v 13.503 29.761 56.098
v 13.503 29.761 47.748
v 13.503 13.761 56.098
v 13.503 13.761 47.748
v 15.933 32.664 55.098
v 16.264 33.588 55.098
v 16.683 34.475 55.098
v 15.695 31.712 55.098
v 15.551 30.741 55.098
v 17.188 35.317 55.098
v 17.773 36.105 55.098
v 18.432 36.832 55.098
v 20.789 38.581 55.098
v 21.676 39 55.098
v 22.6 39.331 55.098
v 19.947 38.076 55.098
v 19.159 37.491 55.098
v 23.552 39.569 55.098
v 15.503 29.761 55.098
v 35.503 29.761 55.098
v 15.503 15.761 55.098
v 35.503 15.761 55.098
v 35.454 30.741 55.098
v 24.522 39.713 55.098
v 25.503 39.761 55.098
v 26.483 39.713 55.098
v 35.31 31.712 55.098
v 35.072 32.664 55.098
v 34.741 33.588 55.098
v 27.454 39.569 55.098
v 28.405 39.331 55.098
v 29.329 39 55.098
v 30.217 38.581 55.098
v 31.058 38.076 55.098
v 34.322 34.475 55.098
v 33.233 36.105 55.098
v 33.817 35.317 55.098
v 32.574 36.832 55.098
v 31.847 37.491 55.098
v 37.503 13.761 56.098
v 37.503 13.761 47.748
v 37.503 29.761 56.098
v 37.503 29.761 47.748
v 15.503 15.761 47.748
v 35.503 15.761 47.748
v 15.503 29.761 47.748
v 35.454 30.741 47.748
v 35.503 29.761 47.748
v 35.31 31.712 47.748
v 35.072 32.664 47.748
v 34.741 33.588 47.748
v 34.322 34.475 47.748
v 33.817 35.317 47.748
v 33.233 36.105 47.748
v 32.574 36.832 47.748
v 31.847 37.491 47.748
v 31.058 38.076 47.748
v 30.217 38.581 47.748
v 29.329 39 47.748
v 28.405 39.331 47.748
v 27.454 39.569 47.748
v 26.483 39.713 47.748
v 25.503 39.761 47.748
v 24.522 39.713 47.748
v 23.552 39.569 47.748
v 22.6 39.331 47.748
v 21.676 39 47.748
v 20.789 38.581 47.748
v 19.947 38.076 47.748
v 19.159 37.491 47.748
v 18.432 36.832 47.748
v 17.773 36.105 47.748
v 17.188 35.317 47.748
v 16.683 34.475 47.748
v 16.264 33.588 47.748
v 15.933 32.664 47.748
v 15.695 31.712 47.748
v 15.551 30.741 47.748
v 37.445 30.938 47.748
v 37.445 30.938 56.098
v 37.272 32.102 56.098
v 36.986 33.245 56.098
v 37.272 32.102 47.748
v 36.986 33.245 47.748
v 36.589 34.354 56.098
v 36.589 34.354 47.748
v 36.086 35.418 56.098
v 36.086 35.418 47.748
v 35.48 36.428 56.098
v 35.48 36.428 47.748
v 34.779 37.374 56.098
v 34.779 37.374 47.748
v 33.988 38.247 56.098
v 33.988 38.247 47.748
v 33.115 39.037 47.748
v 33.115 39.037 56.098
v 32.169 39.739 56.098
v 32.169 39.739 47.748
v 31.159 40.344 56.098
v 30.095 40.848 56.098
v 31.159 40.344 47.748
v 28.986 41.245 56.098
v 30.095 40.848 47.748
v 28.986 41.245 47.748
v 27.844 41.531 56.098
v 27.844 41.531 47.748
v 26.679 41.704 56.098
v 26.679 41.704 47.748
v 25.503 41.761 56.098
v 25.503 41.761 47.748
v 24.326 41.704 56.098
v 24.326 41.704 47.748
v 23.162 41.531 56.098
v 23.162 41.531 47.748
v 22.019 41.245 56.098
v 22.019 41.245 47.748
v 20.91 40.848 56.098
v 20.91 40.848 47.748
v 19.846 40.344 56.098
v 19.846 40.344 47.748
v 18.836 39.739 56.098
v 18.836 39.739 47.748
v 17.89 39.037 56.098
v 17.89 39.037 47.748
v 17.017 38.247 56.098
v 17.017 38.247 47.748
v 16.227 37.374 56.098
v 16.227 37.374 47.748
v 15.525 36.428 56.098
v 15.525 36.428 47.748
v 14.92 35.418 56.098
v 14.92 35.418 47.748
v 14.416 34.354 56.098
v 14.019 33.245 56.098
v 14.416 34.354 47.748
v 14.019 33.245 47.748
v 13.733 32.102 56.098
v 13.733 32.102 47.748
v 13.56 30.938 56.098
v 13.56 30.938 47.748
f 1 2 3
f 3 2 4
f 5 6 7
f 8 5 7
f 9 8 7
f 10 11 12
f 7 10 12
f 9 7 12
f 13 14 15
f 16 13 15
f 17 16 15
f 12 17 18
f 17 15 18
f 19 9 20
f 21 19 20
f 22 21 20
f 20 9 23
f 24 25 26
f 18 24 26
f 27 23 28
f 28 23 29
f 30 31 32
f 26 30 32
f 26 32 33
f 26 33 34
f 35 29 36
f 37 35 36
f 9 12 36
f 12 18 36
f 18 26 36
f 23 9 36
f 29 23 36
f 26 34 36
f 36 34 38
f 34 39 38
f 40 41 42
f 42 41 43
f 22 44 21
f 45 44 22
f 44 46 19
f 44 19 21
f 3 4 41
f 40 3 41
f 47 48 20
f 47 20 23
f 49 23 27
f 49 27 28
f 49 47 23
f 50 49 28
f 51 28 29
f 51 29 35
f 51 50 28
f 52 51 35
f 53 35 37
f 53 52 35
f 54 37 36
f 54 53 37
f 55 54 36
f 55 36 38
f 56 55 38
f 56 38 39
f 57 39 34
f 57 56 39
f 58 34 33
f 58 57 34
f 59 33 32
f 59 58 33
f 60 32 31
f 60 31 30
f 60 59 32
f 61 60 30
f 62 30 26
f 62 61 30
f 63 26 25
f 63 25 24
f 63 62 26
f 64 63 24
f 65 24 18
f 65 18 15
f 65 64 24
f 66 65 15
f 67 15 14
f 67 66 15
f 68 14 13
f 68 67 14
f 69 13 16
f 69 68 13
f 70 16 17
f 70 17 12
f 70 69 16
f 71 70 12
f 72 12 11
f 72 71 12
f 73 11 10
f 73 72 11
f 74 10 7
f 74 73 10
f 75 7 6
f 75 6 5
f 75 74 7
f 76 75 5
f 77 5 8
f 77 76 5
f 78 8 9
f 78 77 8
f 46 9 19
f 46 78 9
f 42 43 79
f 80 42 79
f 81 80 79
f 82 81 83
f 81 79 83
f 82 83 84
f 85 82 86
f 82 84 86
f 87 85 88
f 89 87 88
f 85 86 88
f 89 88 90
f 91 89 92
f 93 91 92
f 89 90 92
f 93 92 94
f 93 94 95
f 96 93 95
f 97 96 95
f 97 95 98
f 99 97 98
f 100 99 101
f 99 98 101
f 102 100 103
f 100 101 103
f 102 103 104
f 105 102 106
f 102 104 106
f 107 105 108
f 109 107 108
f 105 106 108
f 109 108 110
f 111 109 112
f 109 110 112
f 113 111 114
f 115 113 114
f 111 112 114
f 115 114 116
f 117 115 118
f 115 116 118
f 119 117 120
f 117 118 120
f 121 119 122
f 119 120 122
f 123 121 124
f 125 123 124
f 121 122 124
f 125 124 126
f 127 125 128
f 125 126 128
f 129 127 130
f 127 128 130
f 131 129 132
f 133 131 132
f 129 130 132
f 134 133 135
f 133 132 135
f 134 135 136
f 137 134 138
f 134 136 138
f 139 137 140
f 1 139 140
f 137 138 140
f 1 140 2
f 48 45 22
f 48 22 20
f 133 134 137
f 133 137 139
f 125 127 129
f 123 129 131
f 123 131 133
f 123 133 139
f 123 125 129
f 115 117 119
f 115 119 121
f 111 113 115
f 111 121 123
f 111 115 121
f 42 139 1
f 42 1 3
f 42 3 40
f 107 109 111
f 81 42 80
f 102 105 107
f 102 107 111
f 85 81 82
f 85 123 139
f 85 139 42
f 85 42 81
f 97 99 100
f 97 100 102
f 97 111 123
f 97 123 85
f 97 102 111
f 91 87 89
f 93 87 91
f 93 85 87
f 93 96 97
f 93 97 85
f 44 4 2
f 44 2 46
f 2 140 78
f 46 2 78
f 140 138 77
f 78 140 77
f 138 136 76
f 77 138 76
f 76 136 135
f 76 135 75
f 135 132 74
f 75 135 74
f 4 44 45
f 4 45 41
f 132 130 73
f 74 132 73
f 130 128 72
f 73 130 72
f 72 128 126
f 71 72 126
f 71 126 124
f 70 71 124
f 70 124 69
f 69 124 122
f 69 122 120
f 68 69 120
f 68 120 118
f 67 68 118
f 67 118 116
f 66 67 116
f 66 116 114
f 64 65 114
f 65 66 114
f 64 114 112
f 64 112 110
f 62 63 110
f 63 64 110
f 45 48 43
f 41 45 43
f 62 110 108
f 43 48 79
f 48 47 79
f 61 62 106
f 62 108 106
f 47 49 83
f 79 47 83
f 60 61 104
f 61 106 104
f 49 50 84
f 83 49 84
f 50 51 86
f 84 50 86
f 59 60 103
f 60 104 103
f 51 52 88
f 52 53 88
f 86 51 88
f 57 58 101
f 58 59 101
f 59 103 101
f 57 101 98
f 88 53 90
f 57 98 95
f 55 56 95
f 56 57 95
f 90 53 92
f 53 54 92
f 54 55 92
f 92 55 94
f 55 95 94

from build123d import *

# Parameters (mm, degrees)
SKETCH1_R           = 8.5
BOSS_EXTRUDE1_DEPTH = 1
BOSS_EXTRUDE2_START = -7.35
BOSS_EXTRUDE2_DEPTH = 7.35


with BuildPart() as part:
    # Sketch1 → Boss-Extrude1 (new body)
    # profile 1 of 3: a face of its own
    with BuildSketch(Plane.XY.offset(55.098344014)):
        with BuildLine():
            Line((37.502628192, 13.761312554), (37.502628192, 29.761312554))
            ThreePointArc((37.502628192, 29.761312554), (25.502628192, 41.761312554), (13.502628192, 29.761312554))
            Line((13.502628192, 29.761312554), (13.502628192, 13.761312554))
            Line((13.502628192, 13.761312554), (37.502628192, 13.761312554))
        make_face()
        with BuildLine():
            ThreePointArc((35.502628192, 29.761312554), (25.502628192, 39.761312554), (15.502628192, 29.761312554))
            Line((15.502628192, 29.761312554), (15.502628192, 15.761312554))
            Line((15.502628192, 15.761312554), (35.502628192, 15.761312554))
            Line((35.502628192, 15.761312554), (35.502628192, 29.761312554))
        make_face(mode=Mode.SUBTRACT)
    # profile 2 of 3: a face of its own
    with BuildSketch(Plane.XY.offset(55.098344014)):
        with BuildLine():
            Line((35.502628192, 15.761312554), (35.502628192, 29.761312554))
            ThreePointArc((35.502628192, 29.761312554), (25.502628192, 39.761312554), (15.502628192, 29.761312554))
            Line((15.502628192, 29.761312554), (15.502628192, 15.761312554))
            Line((15.502628192, 15.761312554), (35.502628192, 15.761312554))
        make_face()
        with Locations((25.502628192, 29.761312554)):
            Circle(SKETCH1_R, mode=Mode.SUBTRACT)
    # profile 3 of 3: a face of its own
    with BuildSketch(Plane.XY.offset(55.098344014)):
        with Locations((25.502628192, 29.761312554)):
            Circle(SKETCH1_R)
    extrude(amount=BOSS_EXTRUDE1_DEPTH)

    # Sketch1<4> → Boss-Extrude2 (add)
    with BuildSketch(Plane.XY.offset(55.098344014).offset(BOSS_EXTRUDE2_START)):
        with BuildLine():
            Line((13.502628192, 29.761312554), (13.502628192, 13.761312554))
            Line((13.502628192, 13.761312554), (37.502628192, 13.761312554))
            Line((37.502628192, 13.761312554), (37.502628192, 29.761312554))
            ThreePointArc((37.502628192, 29.761312554), (25.502628192, 41.761312554), (13.502628192, 29.761312554))
        make_face()
        with BuildLine():
            Line((15.502628192, 29.761312554), (15.502628192, 15.761312554))
            Line((15.502628192, 15.761312554), (35.502628192, 15.761312554))
            Line((35.502628192, 15.761312554), (35.502628192, 29.761312554))
            ThreePointArc((35.502628192, 29.761312554), (25.502628192, 39.761312554), (15.502628192, 29.761312554))
        make_face(mode=Mode.SUBTRACT)
    extrude(amount=BOSS_EXTRUDE2_DEPTH)


solid = part.part
